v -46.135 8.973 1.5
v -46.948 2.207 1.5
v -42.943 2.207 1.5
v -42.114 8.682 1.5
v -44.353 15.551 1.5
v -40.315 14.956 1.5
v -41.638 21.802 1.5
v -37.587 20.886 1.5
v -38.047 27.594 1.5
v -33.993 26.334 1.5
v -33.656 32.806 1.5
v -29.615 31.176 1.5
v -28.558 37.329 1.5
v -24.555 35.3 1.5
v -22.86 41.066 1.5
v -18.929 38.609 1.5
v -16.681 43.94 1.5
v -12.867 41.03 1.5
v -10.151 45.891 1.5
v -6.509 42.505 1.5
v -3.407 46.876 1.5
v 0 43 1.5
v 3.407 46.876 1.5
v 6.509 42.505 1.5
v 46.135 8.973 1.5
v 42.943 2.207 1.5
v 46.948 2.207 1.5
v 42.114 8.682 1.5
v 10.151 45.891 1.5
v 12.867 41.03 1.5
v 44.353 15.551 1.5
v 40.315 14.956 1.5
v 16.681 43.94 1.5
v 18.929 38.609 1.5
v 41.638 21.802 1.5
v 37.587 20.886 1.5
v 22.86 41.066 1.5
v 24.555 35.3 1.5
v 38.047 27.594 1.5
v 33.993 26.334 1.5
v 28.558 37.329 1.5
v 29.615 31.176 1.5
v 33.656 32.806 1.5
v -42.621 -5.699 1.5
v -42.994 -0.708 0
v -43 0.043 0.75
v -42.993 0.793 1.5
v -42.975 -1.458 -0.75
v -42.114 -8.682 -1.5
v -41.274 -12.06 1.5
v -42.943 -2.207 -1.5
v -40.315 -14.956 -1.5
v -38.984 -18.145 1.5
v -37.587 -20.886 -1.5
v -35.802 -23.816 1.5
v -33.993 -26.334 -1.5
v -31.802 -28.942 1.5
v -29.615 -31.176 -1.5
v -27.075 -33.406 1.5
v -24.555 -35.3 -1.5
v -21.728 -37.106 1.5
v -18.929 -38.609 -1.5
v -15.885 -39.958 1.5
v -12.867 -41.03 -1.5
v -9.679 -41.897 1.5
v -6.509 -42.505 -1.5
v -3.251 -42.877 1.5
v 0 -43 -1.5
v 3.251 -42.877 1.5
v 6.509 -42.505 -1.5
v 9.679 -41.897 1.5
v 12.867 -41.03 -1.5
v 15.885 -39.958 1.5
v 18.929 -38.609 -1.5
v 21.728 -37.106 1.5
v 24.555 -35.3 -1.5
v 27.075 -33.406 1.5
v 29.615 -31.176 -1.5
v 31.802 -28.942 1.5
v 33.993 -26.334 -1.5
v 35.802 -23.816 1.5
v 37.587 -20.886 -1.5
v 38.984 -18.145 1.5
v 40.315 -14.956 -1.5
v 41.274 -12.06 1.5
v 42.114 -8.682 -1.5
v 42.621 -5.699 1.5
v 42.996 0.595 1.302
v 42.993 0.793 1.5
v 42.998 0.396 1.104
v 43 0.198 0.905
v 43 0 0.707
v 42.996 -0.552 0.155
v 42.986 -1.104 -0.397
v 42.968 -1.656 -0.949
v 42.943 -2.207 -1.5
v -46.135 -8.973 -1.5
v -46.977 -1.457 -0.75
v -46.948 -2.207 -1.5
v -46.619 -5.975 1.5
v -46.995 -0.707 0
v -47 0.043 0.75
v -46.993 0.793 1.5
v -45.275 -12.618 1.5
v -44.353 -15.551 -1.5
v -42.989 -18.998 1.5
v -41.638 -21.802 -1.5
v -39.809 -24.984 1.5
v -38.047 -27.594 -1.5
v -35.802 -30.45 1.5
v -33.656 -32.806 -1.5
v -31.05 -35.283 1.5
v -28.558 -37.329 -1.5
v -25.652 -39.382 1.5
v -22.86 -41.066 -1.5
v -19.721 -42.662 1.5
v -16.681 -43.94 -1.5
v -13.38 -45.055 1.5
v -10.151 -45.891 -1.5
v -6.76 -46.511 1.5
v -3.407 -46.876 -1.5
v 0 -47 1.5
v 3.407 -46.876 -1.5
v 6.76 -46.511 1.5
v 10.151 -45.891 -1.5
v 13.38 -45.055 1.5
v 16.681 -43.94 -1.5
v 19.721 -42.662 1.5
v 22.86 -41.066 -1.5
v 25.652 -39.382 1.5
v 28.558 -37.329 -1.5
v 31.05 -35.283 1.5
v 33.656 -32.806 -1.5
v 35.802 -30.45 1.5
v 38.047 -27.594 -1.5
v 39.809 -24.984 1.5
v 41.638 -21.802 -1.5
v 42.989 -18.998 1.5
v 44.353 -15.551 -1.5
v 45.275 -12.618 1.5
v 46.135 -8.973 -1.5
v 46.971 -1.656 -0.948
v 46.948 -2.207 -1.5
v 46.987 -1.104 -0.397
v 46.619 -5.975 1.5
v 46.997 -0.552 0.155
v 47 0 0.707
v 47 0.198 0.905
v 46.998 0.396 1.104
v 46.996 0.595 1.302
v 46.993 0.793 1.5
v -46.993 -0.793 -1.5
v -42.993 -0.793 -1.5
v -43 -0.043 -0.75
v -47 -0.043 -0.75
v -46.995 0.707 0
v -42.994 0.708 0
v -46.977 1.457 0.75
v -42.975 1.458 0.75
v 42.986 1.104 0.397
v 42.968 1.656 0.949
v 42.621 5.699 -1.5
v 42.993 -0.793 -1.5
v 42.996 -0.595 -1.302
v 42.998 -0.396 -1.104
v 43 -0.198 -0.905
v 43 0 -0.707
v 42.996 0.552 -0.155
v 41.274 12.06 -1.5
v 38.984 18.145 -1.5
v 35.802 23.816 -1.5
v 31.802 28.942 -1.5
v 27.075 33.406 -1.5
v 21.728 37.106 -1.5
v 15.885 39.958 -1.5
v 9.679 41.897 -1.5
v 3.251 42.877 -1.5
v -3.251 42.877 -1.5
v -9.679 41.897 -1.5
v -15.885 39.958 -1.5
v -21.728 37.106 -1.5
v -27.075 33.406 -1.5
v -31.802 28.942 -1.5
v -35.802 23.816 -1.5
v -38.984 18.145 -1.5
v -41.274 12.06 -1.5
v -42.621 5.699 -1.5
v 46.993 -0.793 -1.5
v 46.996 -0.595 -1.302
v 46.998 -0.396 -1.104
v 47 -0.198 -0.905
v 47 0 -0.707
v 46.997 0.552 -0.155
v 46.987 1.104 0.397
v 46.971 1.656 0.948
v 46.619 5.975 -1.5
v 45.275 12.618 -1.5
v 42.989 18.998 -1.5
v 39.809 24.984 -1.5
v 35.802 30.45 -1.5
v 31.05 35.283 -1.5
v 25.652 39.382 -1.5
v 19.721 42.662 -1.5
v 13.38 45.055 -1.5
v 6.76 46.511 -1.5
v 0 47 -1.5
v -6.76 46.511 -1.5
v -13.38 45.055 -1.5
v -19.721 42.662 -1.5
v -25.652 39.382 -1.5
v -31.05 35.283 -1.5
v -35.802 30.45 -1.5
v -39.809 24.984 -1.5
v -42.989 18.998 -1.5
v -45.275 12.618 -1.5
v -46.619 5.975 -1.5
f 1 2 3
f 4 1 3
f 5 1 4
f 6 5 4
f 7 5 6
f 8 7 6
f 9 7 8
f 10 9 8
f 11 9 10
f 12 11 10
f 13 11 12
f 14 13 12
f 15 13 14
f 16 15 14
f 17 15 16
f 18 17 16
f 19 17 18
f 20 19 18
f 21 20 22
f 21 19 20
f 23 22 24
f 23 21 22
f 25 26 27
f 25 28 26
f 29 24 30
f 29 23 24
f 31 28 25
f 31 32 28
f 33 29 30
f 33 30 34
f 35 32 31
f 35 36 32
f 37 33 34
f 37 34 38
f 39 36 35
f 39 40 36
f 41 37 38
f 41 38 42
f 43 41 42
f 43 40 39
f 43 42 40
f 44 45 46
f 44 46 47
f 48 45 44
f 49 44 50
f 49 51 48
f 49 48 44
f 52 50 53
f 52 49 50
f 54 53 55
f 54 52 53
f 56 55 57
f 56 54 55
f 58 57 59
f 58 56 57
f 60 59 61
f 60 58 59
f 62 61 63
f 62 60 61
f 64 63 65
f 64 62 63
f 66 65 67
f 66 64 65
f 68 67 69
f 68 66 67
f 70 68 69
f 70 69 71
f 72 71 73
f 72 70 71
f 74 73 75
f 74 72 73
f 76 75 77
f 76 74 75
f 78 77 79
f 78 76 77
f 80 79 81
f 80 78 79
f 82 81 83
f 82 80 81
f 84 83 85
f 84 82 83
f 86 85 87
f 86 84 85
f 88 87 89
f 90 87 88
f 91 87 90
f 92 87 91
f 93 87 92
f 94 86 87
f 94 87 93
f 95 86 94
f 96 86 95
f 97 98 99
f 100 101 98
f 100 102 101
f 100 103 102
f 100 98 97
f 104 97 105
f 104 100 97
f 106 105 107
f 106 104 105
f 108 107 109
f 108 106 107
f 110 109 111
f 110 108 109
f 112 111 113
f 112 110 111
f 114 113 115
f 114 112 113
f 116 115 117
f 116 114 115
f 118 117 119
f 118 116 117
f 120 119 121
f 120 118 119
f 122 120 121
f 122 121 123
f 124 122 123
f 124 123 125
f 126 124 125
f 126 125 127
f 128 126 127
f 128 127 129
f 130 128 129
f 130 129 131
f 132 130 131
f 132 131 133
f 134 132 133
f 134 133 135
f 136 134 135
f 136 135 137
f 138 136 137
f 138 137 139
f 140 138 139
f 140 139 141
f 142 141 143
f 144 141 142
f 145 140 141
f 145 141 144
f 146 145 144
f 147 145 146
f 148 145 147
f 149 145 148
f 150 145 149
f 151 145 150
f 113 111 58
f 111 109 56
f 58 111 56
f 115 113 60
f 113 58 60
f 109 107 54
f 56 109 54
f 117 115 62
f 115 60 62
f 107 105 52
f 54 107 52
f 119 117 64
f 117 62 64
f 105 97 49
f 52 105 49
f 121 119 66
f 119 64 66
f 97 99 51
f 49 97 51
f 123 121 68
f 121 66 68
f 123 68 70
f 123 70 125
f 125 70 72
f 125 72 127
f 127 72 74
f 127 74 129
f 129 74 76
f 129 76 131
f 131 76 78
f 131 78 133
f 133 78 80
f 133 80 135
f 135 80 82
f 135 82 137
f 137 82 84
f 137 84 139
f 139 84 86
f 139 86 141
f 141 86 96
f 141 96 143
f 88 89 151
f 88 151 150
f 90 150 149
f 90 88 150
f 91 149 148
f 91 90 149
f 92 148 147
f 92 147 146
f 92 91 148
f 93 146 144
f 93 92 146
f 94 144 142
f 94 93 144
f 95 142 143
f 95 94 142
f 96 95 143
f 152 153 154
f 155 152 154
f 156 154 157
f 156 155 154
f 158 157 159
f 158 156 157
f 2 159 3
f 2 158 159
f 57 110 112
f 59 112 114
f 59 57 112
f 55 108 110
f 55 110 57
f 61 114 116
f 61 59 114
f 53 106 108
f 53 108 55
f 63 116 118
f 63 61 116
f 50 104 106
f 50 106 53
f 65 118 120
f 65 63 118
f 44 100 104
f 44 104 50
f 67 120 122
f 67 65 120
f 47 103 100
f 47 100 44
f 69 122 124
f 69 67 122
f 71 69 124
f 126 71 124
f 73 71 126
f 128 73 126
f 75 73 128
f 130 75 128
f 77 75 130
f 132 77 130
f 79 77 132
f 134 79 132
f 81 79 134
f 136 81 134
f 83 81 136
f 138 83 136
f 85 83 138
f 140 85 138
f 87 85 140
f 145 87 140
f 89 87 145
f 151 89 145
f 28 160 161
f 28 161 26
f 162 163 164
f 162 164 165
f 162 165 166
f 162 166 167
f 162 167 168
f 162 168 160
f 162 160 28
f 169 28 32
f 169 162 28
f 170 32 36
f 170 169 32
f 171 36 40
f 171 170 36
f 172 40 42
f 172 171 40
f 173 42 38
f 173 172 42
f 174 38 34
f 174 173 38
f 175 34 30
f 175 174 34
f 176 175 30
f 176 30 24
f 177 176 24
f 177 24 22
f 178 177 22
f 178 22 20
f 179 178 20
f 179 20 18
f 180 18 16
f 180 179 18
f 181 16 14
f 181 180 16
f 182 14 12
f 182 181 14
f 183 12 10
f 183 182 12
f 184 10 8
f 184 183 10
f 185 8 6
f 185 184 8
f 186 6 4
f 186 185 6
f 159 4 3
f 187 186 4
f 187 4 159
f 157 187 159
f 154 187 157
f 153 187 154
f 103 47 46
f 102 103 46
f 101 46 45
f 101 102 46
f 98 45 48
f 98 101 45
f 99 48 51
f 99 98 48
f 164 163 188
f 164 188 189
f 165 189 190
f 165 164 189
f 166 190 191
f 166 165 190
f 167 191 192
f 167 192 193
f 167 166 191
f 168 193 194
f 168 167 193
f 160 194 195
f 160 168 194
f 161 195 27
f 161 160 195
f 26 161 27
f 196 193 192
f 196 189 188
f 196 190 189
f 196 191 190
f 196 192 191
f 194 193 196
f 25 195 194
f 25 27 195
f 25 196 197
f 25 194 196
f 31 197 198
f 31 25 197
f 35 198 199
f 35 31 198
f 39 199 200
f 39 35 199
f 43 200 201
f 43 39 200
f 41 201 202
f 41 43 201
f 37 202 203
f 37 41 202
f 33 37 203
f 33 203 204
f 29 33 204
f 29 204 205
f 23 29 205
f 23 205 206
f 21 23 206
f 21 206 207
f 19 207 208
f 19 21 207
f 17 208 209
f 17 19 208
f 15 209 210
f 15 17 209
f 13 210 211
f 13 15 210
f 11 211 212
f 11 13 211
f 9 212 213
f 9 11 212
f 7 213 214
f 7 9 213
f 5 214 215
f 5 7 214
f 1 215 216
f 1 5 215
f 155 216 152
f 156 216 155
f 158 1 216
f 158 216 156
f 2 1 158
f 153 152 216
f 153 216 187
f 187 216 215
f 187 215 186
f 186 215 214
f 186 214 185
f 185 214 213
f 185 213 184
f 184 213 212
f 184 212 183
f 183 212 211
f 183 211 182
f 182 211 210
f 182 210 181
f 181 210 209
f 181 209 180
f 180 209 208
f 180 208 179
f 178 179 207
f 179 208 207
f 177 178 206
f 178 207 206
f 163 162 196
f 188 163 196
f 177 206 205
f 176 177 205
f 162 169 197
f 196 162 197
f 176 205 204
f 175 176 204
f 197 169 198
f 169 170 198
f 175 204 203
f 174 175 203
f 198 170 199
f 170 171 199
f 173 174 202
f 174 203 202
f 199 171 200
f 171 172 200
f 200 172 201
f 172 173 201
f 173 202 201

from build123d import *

# Parameters (mm, degrees)
SKETCH1_R               = 47
SKETCH1_R_2             = 43
BOSS_EXTRUDE1_DEPTH     = 1.5
CUT_EXTRUDE2_DEPTH      = 67.484960705
CUT_EXTRUDE2_DEPTH_BACK = 67.484960705


with BuildPart() as part:
    # Sketch1 → Boss-Extrude1 (new, symmetric)
    with BuildSketch(Plane.XY):
        Circle(SKETCH1_R)
        Circle(SKETCH1_R_2, mode=Mode.SUBTRACT)
    extrude(amount=BOSS_EXTRUDE1_DEPTH, both=True)

    # Sketch2 → Cut-Extrude2 (cut, two sides: drawn at the far end of the back side and taken through both)
    with BuildSketch(Plane(origin=(0, 0, 0), x_dir=(0, 0, -1), z_dir=(1, 0, 0)).offset(-CUT_EXTRUDE2_DEPTH_BACK)):
        Polygon((-4.065273559, 3.358166778), (5.813590619, -6.5206974), (6.5206974, -5.813590619), (-3.358166778, 4.065273559), align=None)
    extrude(amount=CUT_EXTRUDE2_DEPTH + CUT_EXTRUDE2_DEPTH_BACK, mode=Mode.SUBTRACT)


with BuildPart() as cut_extrude2_piece_1:
    # of the separate pieces the step leaves, piece 1, a body of its own (cut_extrude2_pieces)
    add(part.part.solids().sort_by_distance((46.993311443, 0.792893219, 1.5))[0])


with BuildPart() as cut_extrude2_piece_2:
    # of the separate pieces the step leaves, piece 2, a body of its own (cut_extrude2_pieces)
    add(part.part.solids().sort_by_distance((47, 0, -0.707106781))[0])


solid = Compound([cut_extrude2_piece_1.part, cut_extrude2_piece_2.part])
